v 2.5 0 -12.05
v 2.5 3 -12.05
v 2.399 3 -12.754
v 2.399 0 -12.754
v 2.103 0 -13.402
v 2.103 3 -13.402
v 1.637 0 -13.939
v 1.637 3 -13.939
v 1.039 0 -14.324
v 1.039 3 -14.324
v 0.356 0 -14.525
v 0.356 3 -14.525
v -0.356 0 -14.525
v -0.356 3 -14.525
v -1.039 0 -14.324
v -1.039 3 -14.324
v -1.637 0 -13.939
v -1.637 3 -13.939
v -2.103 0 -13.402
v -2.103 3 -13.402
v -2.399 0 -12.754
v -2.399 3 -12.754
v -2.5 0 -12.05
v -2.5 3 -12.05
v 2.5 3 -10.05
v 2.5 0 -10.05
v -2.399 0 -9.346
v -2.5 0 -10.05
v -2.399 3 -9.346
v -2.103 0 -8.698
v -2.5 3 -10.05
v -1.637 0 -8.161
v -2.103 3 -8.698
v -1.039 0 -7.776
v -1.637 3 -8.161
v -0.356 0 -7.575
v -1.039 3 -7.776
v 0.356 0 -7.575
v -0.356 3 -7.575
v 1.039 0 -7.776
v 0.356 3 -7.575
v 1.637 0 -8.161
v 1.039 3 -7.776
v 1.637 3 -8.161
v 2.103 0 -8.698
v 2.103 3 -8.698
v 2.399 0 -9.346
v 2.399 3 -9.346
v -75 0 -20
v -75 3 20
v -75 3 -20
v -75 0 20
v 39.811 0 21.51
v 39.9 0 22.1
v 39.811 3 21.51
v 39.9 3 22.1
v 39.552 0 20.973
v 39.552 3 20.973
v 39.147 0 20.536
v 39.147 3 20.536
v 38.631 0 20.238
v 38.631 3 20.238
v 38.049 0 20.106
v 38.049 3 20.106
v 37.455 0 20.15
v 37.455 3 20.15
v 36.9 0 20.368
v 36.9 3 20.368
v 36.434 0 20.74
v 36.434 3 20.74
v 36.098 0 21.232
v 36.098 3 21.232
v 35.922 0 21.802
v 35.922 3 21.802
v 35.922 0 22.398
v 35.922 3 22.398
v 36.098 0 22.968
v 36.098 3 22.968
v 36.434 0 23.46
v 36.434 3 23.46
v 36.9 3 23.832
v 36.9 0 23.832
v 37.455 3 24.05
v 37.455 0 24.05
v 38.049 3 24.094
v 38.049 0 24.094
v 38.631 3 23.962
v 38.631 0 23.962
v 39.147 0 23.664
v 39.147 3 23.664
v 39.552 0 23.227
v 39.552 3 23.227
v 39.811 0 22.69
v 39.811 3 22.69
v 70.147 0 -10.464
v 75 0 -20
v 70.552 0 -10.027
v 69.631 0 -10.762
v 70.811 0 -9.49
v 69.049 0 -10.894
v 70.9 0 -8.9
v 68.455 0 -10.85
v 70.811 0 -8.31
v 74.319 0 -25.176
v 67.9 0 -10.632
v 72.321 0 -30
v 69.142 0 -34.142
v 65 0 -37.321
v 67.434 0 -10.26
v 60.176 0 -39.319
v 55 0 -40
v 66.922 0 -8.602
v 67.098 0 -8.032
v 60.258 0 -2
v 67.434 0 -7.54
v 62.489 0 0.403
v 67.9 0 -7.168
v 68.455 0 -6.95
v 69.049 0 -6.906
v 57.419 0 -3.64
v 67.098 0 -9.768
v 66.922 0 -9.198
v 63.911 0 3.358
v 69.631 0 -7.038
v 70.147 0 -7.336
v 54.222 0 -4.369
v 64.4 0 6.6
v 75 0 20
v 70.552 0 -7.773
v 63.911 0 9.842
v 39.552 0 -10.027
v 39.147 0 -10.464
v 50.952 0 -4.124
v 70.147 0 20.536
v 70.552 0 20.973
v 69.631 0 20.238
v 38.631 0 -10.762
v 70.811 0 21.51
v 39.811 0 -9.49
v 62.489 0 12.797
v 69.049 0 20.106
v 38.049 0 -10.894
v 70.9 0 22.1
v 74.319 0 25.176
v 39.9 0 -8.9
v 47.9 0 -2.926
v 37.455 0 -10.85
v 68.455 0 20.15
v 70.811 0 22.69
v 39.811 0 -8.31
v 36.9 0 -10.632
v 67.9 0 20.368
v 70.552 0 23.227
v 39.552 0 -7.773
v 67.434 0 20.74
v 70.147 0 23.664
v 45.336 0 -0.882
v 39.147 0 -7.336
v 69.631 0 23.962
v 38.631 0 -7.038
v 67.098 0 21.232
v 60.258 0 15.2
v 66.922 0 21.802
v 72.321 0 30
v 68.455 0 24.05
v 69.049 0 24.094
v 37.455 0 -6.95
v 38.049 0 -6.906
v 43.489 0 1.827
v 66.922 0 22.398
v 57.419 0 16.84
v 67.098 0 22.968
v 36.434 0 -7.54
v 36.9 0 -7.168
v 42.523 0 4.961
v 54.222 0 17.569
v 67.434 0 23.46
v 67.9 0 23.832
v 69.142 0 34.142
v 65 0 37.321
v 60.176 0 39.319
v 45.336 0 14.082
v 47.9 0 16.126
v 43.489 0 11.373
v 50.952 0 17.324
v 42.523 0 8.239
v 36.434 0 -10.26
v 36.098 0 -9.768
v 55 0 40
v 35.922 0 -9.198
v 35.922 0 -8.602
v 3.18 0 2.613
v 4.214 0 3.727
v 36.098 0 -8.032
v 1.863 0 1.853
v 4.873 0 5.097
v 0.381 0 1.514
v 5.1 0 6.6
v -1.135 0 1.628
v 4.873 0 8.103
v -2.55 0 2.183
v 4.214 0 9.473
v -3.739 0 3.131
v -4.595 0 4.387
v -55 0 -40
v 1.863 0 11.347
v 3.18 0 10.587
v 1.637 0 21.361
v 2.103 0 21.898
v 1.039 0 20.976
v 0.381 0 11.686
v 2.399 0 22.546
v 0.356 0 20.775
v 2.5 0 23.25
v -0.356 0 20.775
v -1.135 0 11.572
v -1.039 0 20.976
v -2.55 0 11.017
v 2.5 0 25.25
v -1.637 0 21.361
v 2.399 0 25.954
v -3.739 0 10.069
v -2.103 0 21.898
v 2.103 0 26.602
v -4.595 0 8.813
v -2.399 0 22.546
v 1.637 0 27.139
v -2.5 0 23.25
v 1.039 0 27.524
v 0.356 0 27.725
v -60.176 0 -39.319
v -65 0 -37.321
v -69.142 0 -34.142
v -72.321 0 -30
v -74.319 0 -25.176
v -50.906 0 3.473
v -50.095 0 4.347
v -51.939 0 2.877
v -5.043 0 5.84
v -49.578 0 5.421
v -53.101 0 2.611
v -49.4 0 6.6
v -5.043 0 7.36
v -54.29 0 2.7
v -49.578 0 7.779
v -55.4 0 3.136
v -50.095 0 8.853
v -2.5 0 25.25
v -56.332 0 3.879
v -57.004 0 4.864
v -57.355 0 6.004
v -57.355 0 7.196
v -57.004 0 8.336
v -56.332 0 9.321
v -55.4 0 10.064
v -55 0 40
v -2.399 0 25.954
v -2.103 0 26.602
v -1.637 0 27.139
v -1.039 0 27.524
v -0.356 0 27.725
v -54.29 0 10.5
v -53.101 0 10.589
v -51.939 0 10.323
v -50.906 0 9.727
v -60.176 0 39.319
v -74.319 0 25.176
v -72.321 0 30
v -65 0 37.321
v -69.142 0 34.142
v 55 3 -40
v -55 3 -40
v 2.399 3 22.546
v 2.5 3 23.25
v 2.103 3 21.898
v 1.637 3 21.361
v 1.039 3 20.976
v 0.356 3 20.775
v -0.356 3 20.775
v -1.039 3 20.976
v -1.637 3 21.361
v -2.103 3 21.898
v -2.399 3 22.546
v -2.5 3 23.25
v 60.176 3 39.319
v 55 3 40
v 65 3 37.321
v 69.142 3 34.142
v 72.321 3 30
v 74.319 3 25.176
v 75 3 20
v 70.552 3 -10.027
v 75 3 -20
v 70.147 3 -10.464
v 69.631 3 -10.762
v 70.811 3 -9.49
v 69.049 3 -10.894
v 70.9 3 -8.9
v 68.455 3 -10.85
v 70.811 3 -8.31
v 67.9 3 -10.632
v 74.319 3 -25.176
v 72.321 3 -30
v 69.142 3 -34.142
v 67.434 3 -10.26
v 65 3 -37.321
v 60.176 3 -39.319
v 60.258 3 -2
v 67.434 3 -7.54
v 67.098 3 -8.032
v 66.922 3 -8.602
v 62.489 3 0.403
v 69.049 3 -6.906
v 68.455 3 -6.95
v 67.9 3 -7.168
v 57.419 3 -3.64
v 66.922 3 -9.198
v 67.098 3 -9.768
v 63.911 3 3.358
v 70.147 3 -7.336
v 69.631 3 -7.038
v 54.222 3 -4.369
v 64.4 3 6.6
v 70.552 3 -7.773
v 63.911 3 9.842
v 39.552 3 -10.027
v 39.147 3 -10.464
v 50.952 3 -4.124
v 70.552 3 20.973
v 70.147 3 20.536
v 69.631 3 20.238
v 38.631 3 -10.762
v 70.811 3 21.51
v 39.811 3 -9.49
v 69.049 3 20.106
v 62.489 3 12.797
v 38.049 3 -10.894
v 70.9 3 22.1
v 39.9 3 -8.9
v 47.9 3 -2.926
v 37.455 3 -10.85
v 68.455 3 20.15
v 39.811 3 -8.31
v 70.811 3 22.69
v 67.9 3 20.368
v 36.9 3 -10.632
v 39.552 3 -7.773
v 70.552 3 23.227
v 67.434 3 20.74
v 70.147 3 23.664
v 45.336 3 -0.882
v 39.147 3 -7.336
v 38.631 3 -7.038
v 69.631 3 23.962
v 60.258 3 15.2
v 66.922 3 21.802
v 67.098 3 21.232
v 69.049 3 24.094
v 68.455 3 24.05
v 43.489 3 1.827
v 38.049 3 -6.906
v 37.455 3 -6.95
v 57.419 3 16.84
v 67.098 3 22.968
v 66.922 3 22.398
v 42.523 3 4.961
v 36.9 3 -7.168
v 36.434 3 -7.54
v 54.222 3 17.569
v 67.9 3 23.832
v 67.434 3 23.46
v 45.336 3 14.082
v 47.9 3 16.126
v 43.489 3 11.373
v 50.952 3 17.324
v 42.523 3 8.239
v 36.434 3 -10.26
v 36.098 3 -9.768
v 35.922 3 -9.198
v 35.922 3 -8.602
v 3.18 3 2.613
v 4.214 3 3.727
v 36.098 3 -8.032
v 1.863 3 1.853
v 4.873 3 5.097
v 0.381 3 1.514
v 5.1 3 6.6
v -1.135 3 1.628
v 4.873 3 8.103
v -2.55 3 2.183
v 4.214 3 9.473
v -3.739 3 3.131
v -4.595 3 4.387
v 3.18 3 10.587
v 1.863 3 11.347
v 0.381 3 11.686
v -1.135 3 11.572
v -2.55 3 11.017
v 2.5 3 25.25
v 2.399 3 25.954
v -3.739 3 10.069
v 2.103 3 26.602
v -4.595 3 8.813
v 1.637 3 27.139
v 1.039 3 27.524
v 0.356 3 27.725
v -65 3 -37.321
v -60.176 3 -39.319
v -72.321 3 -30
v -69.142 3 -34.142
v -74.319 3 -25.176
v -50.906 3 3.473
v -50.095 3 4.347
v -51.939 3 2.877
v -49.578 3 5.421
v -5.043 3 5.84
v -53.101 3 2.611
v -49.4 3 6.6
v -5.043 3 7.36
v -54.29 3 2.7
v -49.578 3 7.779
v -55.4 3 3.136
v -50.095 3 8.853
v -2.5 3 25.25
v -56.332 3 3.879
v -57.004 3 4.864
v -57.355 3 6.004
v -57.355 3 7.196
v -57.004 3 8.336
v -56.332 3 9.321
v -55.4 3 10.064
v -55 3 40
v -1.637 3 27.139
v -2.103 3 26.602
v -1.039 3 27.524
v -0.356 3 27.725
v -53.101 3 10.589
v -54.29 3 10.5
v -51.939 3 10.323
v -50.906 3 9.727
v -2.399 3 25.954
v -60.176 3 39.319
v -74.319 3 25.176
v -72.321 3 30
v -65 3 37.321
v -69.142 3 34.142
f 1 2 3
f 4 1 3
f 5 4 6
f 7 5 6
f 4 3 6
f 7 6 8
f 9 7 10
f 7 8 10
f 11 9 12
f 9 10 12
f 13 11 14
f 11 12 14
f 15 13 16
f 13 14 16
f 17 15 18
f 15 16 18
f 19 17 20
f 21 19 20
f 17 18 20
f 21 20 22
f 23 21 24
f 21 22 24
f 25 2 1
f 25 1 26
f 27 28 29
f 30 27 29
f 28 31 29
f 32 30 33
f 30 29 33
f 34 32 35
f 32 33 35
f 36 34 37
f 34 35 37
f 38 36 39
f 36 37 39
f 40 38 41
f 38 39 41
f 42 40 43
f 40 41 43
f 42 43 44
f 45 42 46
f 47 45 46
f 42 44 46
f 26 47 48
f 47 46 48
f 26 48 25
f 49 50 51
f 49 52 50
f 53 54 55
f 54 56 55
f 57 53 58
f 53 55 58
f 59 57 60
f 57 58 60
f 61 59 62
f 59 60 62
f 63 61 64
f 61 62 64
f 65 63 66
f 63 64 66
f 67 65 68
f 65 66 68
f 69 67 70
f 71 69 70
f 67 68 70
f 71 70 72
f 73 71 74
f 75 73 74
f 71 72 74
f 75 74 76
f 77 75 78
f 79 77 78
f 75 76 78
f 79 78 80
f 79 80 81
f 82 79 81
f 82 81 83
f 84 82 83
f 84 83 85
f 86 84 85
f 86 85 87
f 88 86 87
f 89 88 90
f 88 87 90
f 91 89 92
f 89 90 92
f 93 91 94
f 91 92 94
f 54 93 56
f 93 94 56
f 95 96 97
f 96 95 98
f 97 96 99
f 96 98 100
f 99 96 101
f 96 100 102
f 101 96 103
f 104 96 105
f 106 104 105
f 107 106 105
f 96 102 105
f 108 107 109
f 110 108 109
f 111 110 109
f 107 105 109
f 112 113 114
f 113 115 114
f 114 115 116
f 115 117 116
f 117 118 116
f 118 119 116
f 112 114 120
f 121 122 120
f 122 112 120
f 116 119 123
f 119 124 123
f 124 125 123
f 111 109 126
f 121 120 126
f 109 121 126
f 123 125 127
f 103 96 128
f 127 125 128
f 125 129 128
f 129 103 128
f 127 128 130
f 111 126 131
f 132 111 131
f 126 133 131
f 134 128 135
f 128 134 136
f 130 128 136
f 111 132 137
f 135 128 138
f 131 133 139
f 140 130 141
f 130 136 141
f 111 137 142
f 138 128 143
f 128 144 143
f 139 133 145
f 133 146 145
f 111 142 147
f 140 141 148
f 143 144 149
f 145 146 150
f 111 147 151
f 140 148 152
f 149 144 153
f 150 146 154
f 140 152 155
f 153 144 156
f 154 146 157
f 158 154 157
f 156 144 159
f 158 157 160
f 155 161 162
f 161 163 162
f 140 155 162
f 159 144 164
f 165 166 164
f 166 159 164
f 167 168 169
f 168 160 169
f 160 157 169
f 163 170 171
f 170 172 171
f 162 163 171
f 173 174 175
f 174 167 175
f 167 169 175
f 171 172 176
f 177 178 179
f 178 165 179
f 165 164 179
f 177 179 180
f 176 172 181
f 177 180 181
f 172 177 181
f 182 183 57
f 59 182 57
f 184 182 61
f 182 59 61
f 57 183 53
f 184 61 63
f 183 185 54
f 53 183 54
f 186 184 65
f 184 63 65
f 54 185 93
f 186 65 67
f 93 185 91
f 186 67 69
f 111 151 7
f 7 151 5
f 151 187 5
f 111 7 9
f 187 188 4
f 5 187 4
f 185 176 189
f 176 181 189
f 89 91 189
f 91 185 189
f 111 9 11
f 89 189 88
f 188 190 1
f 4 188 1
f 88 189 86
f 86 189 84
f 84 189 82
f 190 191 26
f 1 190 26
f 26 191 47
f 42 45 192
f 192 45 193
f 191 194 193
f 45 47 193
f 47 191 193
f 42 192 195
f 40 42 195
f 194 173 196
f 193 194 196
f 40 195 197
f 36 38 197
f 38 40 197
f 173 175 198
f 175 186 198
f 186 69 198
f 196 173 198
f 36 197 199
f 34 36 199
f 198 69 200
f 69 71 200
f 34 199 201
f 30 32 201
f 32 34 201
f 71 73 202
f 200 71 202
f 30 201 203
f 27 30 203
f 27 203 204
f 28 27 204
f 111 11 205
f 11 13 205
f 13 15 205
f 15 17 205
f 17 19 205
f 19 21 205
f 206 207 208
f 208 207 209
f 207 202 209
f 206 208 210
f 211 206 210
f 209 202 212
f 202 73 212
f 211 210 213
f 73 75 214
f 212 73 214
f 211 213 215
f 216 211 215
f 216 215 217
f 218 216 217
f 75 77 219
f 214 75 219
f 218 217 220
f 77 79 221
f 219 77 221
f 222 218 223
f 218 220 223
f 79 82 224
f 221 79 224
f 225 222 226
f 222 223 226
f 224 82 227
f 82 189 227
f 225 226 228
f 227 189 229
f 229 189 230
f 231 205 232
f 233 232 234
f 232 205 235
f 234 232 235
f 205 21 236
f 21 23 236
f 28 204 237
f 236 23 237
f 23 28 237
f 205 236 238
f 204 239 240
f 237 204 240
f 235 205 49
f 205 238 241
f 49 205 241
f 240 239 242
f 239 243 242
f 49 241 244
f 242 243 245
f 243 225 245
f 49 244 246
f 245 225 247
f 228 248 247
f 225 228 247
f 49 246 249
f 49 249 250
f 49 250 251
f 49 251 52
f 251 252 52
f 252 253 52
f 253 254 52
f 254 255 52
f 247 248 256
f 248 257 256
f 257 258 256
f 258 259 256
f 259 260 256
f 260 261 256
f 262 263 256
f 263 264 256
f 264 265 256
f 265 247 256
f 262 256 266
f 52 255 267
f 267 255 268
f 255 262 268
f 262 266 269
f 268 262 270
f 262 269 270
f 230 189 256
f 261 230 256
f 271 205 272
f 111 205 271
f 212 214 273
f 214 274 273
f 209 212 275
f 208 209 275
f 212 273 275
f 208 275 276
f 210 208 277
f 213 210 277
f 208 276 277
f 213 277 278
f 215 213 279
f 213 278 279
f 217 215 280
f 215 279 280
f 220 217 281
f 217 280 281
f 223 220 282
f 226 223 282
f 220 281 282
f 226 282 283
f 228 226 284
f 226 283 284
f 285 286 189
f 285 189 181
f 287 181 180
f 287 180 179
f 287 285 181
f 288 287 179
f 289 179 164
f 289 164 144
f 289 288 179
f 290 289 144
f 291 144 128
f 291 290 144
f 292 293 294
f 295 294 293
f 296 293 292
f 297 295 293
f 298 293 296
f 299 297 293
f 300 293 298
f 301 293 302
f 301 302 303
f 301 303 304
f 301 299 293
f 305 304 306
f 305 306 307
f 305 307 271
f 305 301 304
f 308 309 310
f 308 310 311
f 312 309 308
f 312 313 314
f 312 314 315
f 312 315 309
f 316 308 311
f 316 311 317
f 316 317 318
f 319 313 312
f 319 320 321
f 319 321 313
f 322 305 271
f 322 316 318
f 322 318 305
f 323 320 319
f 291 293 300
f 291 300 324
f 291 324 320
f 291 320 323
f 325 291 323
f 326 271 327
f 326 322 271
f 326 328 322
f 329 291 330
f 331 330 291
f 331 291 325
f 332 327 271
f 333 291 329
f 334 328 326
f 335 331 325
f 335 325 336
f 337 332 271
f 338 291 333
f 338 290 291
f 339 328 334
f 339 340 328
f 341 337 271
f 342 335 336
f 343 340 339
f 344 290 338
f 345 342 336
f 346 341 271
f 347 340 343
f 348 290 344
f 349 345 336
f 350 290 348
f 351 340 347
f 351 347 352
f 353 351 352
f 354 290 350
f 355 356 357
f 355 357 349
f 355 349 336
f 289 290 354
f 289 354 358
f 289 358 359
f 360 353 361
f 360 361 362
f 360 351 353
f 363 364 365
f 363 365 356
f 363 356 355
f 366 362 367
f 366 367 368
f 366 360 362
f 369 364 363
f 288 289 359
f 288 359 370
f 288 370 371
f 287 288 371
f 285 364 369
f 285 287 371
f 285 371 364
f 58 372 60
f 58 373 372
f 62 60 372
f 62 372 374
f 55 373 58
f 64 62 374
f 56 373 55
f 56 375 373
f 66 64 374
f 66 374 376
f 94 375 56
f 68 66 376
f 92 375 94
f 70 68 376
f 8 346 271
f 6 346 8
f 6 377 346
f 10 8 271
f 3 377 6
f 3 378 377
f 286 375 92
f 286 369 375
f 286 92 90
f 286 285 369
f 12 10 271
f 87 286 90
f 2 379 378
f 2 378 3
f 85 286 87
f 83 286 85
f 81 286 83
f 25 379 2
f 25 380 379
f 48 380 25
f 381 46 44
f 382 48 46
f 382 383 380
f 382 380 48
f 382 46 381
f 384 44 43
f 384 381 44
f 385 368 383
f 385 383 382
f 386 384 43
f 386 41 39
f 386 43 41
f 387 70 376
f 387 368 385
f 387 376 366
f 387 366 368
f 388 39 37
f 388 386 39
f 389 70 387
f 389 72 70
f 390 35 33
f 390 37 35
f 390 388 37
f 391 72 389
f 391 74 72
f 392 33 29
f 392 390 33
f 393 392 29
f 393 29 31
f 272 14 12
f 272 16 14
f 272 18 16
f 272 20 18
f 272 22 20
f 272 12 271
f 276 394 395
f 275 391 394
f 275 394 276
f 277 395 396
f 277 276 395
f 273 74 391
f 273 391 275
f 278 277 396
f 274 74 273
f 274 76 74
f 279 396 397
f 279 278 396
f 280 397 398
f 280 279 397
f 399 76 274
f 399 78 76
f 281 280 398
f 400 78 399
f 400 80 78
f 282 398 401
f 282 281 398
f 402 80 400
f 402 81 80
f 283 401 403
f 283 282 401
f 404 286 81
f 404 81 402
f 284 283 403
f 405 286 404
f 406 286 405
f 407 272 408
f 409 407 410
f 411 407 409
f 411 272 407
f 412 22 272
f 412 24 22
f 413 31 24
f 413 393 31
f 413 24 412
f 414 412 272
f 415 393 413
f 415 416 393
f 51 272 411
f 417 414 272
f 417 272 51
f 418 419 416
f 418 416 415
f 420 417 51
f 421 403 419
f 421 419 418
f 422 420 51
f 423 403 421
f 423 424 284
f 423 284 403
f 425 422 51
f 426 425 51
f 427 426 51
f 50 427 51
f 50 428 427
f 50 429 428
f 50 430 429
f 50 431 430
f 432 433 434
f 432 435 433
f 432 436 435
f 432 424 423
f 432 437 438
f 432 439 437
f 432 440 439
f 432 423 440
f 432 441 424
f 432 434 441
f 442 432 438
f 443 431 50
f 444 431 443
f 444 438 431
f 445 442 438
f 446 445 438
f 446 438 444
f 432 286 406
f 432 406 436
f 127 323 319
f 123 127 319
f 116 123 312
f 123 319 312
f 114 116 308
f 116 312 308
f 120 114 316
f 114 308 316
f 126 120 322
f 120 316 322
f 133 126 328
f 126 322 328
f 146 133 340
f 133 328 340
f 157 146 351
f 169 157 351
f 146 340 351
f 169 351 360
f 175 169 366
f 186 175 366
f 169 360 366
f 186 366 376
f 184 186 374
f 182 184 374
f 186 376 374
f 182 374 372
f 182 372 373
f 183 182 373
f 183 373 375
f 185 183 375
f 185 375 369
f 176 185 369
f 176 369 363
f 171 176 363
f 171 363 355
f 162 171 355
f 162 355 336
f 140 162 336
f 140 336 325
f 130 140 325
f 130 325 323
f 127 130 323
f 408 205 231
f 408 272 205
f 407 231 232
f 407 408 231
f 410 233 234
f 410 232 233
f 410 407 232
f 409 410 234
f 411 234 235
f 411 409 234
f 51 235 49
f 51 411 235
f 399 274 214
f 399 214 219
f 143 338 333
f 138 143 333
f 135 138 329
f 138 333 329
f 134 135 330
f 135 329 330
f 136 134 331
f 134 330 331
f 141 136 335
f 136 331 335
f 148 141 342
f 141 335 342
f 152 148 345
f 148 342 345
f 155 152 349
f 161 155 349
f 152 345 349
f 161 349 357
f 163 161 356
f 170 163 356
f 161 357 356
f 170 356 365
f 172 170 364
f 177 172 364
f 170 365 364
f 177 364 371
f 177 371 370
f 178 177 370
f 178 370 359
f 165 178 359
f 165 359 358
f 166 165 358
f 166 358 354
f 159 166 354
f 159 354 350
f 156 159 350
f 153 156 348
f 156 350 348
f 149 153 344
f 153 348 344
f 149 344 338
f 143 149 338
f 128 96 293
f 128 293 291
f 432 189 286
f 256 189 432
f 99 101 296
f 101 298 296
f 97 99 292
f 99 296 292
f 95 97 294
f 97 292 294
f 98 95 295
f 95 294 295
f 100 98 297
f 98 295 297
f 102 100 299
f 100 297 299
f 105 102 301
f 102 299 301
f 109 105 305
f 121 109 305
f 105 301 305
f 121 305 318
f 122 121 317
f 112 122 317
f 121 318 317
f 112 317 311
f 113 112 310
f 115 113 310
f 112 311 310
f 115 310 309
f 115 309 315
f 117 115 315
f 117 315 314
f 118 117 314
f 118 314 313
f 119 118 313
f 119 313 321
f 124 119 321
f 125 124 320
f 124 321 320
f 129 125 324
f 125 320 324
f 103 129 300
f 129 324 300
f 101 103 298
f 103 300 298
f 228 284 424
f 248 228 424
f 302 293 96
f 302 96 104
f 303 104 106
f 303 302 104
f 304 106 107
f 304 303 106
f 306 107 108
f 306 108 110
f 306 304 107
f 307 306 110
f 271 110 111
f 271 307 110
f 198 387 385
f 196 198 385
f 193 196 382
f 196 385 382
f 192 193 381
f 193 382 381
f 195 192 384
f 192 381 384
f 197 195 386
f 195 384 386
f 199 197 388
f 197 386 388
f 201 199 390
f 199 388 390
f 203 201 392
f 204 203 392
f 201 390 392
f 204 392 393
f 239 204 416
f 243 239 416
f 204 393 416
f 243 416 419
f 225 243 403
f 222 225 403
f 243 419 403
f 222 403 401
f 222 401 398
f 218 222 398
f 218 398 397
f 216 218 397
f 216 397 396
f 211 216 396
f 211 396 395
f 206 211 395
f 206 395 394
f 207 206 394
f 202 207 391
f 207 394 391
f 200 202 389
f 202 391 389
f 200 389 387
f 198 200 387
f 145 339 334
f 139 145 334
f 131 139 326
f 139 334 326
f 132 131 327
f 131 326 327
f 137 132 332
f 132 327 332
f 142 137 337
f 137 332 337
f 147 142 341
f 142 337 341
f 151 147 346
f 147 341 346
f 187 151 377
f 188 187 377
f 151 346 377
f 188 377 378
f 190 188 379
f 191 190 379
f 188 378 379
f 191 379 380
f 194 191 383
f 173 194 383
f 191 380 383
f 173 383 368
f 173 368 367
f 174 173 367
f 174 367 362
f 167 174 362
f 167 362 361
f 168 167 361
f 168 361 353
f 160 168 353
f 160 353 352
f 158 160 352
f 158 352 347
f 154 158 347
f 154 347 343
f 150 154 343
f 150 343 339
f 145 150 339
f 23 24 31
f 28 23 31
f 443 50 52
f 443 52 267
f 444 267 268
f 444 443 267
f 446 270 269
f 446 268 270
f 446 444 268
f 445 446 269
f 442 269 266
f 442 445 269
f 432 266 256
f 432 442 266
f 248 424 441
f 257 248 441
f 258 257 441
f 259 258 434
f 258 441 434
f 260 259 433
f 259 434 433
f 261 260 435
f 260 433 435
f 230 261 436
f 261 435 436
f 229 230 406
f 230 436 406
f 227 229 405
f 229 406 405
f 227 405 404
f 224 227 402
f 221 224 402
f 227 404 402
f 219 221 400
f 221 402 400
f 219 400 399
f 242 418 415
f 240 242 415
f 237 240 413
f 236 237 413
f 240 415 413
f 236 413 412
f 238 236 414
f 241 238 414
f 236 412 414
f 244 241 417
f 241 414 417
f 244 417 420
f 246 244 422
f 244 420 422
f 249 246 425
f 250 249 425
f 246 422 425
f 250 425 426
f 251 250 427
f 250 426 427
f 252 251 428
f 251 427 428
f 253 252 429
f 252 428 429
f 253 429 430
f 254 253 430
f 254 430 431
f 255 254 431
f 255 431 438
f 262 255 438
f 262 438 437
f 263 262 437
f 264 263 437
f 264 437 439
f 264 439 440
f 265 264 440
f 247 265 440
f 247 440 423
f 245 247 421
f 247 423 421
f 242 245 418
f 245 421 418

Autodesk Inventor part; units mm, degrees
ref_plane "YZ Plane" through (0, 0, 0) normal (1, 0, 0) x (0, 1, 0)
ref_plane "XZ Plane" through (0, 0, 0) normal (0, 1, 0) x (-1, 0, 0)
ref_plane "XY Plane" through (0, 0, 0) normal (0, 0, 1) x (1, 0, 0)
sketch "Sketch1" plane through (0, 0, 0) normal (0, 1, 0) x (-1, 0, 0)
  line L0 (-75, 40) -> (75, 40)
  line L1 (75, 40) -> (75, -40)
  line L2 (75, -40) -> (-75, -40)
  line L3 (-75, -40) -> (-75, 40)
  line L4 (-75, 40) -> (75, -40) construction
  line L5 (75, 40) -> (-75, -40) construction
  point P0 (0, 0)
  dimension "d0" = 150
  dimension "d1" = 80
extrude "Extrusion1" add sketch "Sketch1" along normal blind 3
sketch "Sketch5" plane through (0, 3, 0) normal (0, 1, 0) x (1, 0, 0)
  line L0 (-75, 40) -> (-75, -40) projected
  line L1 (75, 40) -> (-75, 40)
  line L2 (-75, 40) -> (-75, 15)
  line L3 (-75, 15) -> (75, 15)
  line L4 (75, 15) -> (75, 40)
  line L5 (21.6, 15) -> (-21.6, 15)
  line L6 (75, 15) -> (31.8, 15)
  line L7 (31.8, 15) -> (31.8, -28.2)
  line L8 (31.8, -28.2) -> (75, -28.2)
  line L9 (75, -28.2) -> (75, 15)
  line L10 (31.8, 15) -> (75, -28.2)
  line L11 (75, 15) -> (31.8, -28.2)
  circle A0 centre (53.4, -6.6) radius 11
  line L12 (37.9, -22.1) -> (68.9, -22.1)
  line L13 (68.9, -22.1) -> (68.9, 8.9)
  line L14 (68.9, 8.9) -> (37.9, 8.9)
  line L15 (37.9, 8.9) -> (37.9, -22.1)
  line L16 (37.9, -22.1) -> (68.9, 8.9) construction
  line L17 (68.9, -22.1) -> (37.9, 8.9) construction
  circle A1 centre (37.9, 8.9) radius 2
  circle A2 centre (68.9, 8.9) radius 2
  circle A3 centre (68.9, -22.1) radius 2
  circle A4 centre (37.9, -22.1) radius 2
  point P0 (309.988, -32.2194)
  dimension "d26" = 25
  dimension "d49" = 150
  dimension "d50" = 43.2
  dimension "d51" = 43.2
  dimension "d52" = 22
  dimension "d53" = 31
  dimension "d54" = 31
  dimension "d55" = 4
  dimension "d56" = 4
  dimension "d57" = 4
  dimension "d58" = 4
extrude "Extrusion4" cut sketch "Sketch5" against normal through all contours A2 L13 L11 | L11 L14 A2 | A1 L14 L10 | L10 L15 A1 | A3 L12 L10 | L10 L13 A3 | L13 A2 L11 | L11 A2 L14 | A4 L15 L11 | L11 L12 A4 | L14 A1 L10 | L10 A1 L15 | L12 A3 L10 | L10 A3 L13 | L15 A4 L11 | L11 A4 L12 | A0 L10 L11 | L11 L10 A0 | L10 L11 A0 | A0 L11 L10
sketch "Sketch6" plane through (0, 3, 0) normal (0, 1, 0) x (1, 0, 0)
  line L0 (75, 40) -> (-75, 40) projected
  line L1 (0, 40) -> (0, 15)
  line L2 (0, 15) -> (0, -28.2)
  line L3 (-21.6, 15) -> (21.6, 15)
  line L4 (21.6, 15) -> (21.6, -28.2)
  line L5 (21.6, -28.2) -> (-21.6, -28.2)
  line L6 (-21.6, -28.2) -> (-21.6, 15)
  line L7 (-21.6, 15) -> (21.6, -28.2) construction
  line L8 (21.6, 15) -> (-21.6, -28.2) construction
  circle A0 centre (0, -6.6) radius 5.1
  line L9 (0, 15) -> (75, 15)
  line L10 (75, 15) -> (31.8, 15)
  line L11 (31.8, 15) -> (31.8, -6.6)
  line L12 (31.8, -6.6) -> (53.4, -6.6)
  line L13 (53.4, -6.6) -> (0, -6.6)
  line L14 (0, -6.6) -> (-53.4, -6.6)
  circle A1 centre (-53.4, -6.6) radius 4
  line L15 (0, -25.25) -> (0, 12.05)
  circle A2 centre (0, 12.05) radius 2.5
  line L16 (0, 12.05) -> (0, 10.05)
  circle A3 centre (0, 10.05) radius 2.5
  circle A4 centre (0, -25.25) radius 2.5
  line L17 (0, -25.25) -> (0, -23.25)
  circle A5 centre (0, -23.25) radius 2.5
  line L18 (-2.5, -23.25) -> (-2.5, -25.25)
  line L19 (2.5, -23.25) -> (2.5, -25.25)
  line L20 (-2.5, 12.05) -> (-2.5, 10.05)
  line L21 (2.5, 12.05) -> (2.5, 10.05)
  point P0 (0, 0)
  dimension "d59" = 25
  dimension "d60" = 43.2
  dimension "d61" = 43.2
  dimension "d62" = 43.2
  dimension "d63" = 10.2
  dimension "d64" = 43.2
  dimension "d65" = 53.4
  dimension "d66" = 8
  dimension "d69" = 37.3
  dimension "d70" = 5
  dimension "d71" = 2
  dimension "d72" = 5
  dimension "d73" = 5
  dimension "d74" = 2
  dimension "d75" = 5
extrude "Extrusion6" cut sketch "Sketch6" against normal through all contours L2 A3 A2 | L2 A2 A3 | A3 A2 L2 | L2 A2 A3 | A2 A3 L2 | L2 A3 A2 | A2 L21 A3 | A3 L20 A2 | A1 | A0 L13 L2 | L2 L14 A0 | L13 A0 L2 | L2 A0 L14 | A5 A4 L2 | L2 A4 A5 | A4 A5 L2 | L2 A5 A4 | L19 A4 A5 | A5 A4 L18 | A4 A5 L2 | L2 A5 A4
fillet "Fillet1" radius 20 4 edges at (75, 1.5, 40) (75, 1.5, -40) (-75, 1.5, 40) (-75, 1.5, -40)
properties part number "TopMount"
